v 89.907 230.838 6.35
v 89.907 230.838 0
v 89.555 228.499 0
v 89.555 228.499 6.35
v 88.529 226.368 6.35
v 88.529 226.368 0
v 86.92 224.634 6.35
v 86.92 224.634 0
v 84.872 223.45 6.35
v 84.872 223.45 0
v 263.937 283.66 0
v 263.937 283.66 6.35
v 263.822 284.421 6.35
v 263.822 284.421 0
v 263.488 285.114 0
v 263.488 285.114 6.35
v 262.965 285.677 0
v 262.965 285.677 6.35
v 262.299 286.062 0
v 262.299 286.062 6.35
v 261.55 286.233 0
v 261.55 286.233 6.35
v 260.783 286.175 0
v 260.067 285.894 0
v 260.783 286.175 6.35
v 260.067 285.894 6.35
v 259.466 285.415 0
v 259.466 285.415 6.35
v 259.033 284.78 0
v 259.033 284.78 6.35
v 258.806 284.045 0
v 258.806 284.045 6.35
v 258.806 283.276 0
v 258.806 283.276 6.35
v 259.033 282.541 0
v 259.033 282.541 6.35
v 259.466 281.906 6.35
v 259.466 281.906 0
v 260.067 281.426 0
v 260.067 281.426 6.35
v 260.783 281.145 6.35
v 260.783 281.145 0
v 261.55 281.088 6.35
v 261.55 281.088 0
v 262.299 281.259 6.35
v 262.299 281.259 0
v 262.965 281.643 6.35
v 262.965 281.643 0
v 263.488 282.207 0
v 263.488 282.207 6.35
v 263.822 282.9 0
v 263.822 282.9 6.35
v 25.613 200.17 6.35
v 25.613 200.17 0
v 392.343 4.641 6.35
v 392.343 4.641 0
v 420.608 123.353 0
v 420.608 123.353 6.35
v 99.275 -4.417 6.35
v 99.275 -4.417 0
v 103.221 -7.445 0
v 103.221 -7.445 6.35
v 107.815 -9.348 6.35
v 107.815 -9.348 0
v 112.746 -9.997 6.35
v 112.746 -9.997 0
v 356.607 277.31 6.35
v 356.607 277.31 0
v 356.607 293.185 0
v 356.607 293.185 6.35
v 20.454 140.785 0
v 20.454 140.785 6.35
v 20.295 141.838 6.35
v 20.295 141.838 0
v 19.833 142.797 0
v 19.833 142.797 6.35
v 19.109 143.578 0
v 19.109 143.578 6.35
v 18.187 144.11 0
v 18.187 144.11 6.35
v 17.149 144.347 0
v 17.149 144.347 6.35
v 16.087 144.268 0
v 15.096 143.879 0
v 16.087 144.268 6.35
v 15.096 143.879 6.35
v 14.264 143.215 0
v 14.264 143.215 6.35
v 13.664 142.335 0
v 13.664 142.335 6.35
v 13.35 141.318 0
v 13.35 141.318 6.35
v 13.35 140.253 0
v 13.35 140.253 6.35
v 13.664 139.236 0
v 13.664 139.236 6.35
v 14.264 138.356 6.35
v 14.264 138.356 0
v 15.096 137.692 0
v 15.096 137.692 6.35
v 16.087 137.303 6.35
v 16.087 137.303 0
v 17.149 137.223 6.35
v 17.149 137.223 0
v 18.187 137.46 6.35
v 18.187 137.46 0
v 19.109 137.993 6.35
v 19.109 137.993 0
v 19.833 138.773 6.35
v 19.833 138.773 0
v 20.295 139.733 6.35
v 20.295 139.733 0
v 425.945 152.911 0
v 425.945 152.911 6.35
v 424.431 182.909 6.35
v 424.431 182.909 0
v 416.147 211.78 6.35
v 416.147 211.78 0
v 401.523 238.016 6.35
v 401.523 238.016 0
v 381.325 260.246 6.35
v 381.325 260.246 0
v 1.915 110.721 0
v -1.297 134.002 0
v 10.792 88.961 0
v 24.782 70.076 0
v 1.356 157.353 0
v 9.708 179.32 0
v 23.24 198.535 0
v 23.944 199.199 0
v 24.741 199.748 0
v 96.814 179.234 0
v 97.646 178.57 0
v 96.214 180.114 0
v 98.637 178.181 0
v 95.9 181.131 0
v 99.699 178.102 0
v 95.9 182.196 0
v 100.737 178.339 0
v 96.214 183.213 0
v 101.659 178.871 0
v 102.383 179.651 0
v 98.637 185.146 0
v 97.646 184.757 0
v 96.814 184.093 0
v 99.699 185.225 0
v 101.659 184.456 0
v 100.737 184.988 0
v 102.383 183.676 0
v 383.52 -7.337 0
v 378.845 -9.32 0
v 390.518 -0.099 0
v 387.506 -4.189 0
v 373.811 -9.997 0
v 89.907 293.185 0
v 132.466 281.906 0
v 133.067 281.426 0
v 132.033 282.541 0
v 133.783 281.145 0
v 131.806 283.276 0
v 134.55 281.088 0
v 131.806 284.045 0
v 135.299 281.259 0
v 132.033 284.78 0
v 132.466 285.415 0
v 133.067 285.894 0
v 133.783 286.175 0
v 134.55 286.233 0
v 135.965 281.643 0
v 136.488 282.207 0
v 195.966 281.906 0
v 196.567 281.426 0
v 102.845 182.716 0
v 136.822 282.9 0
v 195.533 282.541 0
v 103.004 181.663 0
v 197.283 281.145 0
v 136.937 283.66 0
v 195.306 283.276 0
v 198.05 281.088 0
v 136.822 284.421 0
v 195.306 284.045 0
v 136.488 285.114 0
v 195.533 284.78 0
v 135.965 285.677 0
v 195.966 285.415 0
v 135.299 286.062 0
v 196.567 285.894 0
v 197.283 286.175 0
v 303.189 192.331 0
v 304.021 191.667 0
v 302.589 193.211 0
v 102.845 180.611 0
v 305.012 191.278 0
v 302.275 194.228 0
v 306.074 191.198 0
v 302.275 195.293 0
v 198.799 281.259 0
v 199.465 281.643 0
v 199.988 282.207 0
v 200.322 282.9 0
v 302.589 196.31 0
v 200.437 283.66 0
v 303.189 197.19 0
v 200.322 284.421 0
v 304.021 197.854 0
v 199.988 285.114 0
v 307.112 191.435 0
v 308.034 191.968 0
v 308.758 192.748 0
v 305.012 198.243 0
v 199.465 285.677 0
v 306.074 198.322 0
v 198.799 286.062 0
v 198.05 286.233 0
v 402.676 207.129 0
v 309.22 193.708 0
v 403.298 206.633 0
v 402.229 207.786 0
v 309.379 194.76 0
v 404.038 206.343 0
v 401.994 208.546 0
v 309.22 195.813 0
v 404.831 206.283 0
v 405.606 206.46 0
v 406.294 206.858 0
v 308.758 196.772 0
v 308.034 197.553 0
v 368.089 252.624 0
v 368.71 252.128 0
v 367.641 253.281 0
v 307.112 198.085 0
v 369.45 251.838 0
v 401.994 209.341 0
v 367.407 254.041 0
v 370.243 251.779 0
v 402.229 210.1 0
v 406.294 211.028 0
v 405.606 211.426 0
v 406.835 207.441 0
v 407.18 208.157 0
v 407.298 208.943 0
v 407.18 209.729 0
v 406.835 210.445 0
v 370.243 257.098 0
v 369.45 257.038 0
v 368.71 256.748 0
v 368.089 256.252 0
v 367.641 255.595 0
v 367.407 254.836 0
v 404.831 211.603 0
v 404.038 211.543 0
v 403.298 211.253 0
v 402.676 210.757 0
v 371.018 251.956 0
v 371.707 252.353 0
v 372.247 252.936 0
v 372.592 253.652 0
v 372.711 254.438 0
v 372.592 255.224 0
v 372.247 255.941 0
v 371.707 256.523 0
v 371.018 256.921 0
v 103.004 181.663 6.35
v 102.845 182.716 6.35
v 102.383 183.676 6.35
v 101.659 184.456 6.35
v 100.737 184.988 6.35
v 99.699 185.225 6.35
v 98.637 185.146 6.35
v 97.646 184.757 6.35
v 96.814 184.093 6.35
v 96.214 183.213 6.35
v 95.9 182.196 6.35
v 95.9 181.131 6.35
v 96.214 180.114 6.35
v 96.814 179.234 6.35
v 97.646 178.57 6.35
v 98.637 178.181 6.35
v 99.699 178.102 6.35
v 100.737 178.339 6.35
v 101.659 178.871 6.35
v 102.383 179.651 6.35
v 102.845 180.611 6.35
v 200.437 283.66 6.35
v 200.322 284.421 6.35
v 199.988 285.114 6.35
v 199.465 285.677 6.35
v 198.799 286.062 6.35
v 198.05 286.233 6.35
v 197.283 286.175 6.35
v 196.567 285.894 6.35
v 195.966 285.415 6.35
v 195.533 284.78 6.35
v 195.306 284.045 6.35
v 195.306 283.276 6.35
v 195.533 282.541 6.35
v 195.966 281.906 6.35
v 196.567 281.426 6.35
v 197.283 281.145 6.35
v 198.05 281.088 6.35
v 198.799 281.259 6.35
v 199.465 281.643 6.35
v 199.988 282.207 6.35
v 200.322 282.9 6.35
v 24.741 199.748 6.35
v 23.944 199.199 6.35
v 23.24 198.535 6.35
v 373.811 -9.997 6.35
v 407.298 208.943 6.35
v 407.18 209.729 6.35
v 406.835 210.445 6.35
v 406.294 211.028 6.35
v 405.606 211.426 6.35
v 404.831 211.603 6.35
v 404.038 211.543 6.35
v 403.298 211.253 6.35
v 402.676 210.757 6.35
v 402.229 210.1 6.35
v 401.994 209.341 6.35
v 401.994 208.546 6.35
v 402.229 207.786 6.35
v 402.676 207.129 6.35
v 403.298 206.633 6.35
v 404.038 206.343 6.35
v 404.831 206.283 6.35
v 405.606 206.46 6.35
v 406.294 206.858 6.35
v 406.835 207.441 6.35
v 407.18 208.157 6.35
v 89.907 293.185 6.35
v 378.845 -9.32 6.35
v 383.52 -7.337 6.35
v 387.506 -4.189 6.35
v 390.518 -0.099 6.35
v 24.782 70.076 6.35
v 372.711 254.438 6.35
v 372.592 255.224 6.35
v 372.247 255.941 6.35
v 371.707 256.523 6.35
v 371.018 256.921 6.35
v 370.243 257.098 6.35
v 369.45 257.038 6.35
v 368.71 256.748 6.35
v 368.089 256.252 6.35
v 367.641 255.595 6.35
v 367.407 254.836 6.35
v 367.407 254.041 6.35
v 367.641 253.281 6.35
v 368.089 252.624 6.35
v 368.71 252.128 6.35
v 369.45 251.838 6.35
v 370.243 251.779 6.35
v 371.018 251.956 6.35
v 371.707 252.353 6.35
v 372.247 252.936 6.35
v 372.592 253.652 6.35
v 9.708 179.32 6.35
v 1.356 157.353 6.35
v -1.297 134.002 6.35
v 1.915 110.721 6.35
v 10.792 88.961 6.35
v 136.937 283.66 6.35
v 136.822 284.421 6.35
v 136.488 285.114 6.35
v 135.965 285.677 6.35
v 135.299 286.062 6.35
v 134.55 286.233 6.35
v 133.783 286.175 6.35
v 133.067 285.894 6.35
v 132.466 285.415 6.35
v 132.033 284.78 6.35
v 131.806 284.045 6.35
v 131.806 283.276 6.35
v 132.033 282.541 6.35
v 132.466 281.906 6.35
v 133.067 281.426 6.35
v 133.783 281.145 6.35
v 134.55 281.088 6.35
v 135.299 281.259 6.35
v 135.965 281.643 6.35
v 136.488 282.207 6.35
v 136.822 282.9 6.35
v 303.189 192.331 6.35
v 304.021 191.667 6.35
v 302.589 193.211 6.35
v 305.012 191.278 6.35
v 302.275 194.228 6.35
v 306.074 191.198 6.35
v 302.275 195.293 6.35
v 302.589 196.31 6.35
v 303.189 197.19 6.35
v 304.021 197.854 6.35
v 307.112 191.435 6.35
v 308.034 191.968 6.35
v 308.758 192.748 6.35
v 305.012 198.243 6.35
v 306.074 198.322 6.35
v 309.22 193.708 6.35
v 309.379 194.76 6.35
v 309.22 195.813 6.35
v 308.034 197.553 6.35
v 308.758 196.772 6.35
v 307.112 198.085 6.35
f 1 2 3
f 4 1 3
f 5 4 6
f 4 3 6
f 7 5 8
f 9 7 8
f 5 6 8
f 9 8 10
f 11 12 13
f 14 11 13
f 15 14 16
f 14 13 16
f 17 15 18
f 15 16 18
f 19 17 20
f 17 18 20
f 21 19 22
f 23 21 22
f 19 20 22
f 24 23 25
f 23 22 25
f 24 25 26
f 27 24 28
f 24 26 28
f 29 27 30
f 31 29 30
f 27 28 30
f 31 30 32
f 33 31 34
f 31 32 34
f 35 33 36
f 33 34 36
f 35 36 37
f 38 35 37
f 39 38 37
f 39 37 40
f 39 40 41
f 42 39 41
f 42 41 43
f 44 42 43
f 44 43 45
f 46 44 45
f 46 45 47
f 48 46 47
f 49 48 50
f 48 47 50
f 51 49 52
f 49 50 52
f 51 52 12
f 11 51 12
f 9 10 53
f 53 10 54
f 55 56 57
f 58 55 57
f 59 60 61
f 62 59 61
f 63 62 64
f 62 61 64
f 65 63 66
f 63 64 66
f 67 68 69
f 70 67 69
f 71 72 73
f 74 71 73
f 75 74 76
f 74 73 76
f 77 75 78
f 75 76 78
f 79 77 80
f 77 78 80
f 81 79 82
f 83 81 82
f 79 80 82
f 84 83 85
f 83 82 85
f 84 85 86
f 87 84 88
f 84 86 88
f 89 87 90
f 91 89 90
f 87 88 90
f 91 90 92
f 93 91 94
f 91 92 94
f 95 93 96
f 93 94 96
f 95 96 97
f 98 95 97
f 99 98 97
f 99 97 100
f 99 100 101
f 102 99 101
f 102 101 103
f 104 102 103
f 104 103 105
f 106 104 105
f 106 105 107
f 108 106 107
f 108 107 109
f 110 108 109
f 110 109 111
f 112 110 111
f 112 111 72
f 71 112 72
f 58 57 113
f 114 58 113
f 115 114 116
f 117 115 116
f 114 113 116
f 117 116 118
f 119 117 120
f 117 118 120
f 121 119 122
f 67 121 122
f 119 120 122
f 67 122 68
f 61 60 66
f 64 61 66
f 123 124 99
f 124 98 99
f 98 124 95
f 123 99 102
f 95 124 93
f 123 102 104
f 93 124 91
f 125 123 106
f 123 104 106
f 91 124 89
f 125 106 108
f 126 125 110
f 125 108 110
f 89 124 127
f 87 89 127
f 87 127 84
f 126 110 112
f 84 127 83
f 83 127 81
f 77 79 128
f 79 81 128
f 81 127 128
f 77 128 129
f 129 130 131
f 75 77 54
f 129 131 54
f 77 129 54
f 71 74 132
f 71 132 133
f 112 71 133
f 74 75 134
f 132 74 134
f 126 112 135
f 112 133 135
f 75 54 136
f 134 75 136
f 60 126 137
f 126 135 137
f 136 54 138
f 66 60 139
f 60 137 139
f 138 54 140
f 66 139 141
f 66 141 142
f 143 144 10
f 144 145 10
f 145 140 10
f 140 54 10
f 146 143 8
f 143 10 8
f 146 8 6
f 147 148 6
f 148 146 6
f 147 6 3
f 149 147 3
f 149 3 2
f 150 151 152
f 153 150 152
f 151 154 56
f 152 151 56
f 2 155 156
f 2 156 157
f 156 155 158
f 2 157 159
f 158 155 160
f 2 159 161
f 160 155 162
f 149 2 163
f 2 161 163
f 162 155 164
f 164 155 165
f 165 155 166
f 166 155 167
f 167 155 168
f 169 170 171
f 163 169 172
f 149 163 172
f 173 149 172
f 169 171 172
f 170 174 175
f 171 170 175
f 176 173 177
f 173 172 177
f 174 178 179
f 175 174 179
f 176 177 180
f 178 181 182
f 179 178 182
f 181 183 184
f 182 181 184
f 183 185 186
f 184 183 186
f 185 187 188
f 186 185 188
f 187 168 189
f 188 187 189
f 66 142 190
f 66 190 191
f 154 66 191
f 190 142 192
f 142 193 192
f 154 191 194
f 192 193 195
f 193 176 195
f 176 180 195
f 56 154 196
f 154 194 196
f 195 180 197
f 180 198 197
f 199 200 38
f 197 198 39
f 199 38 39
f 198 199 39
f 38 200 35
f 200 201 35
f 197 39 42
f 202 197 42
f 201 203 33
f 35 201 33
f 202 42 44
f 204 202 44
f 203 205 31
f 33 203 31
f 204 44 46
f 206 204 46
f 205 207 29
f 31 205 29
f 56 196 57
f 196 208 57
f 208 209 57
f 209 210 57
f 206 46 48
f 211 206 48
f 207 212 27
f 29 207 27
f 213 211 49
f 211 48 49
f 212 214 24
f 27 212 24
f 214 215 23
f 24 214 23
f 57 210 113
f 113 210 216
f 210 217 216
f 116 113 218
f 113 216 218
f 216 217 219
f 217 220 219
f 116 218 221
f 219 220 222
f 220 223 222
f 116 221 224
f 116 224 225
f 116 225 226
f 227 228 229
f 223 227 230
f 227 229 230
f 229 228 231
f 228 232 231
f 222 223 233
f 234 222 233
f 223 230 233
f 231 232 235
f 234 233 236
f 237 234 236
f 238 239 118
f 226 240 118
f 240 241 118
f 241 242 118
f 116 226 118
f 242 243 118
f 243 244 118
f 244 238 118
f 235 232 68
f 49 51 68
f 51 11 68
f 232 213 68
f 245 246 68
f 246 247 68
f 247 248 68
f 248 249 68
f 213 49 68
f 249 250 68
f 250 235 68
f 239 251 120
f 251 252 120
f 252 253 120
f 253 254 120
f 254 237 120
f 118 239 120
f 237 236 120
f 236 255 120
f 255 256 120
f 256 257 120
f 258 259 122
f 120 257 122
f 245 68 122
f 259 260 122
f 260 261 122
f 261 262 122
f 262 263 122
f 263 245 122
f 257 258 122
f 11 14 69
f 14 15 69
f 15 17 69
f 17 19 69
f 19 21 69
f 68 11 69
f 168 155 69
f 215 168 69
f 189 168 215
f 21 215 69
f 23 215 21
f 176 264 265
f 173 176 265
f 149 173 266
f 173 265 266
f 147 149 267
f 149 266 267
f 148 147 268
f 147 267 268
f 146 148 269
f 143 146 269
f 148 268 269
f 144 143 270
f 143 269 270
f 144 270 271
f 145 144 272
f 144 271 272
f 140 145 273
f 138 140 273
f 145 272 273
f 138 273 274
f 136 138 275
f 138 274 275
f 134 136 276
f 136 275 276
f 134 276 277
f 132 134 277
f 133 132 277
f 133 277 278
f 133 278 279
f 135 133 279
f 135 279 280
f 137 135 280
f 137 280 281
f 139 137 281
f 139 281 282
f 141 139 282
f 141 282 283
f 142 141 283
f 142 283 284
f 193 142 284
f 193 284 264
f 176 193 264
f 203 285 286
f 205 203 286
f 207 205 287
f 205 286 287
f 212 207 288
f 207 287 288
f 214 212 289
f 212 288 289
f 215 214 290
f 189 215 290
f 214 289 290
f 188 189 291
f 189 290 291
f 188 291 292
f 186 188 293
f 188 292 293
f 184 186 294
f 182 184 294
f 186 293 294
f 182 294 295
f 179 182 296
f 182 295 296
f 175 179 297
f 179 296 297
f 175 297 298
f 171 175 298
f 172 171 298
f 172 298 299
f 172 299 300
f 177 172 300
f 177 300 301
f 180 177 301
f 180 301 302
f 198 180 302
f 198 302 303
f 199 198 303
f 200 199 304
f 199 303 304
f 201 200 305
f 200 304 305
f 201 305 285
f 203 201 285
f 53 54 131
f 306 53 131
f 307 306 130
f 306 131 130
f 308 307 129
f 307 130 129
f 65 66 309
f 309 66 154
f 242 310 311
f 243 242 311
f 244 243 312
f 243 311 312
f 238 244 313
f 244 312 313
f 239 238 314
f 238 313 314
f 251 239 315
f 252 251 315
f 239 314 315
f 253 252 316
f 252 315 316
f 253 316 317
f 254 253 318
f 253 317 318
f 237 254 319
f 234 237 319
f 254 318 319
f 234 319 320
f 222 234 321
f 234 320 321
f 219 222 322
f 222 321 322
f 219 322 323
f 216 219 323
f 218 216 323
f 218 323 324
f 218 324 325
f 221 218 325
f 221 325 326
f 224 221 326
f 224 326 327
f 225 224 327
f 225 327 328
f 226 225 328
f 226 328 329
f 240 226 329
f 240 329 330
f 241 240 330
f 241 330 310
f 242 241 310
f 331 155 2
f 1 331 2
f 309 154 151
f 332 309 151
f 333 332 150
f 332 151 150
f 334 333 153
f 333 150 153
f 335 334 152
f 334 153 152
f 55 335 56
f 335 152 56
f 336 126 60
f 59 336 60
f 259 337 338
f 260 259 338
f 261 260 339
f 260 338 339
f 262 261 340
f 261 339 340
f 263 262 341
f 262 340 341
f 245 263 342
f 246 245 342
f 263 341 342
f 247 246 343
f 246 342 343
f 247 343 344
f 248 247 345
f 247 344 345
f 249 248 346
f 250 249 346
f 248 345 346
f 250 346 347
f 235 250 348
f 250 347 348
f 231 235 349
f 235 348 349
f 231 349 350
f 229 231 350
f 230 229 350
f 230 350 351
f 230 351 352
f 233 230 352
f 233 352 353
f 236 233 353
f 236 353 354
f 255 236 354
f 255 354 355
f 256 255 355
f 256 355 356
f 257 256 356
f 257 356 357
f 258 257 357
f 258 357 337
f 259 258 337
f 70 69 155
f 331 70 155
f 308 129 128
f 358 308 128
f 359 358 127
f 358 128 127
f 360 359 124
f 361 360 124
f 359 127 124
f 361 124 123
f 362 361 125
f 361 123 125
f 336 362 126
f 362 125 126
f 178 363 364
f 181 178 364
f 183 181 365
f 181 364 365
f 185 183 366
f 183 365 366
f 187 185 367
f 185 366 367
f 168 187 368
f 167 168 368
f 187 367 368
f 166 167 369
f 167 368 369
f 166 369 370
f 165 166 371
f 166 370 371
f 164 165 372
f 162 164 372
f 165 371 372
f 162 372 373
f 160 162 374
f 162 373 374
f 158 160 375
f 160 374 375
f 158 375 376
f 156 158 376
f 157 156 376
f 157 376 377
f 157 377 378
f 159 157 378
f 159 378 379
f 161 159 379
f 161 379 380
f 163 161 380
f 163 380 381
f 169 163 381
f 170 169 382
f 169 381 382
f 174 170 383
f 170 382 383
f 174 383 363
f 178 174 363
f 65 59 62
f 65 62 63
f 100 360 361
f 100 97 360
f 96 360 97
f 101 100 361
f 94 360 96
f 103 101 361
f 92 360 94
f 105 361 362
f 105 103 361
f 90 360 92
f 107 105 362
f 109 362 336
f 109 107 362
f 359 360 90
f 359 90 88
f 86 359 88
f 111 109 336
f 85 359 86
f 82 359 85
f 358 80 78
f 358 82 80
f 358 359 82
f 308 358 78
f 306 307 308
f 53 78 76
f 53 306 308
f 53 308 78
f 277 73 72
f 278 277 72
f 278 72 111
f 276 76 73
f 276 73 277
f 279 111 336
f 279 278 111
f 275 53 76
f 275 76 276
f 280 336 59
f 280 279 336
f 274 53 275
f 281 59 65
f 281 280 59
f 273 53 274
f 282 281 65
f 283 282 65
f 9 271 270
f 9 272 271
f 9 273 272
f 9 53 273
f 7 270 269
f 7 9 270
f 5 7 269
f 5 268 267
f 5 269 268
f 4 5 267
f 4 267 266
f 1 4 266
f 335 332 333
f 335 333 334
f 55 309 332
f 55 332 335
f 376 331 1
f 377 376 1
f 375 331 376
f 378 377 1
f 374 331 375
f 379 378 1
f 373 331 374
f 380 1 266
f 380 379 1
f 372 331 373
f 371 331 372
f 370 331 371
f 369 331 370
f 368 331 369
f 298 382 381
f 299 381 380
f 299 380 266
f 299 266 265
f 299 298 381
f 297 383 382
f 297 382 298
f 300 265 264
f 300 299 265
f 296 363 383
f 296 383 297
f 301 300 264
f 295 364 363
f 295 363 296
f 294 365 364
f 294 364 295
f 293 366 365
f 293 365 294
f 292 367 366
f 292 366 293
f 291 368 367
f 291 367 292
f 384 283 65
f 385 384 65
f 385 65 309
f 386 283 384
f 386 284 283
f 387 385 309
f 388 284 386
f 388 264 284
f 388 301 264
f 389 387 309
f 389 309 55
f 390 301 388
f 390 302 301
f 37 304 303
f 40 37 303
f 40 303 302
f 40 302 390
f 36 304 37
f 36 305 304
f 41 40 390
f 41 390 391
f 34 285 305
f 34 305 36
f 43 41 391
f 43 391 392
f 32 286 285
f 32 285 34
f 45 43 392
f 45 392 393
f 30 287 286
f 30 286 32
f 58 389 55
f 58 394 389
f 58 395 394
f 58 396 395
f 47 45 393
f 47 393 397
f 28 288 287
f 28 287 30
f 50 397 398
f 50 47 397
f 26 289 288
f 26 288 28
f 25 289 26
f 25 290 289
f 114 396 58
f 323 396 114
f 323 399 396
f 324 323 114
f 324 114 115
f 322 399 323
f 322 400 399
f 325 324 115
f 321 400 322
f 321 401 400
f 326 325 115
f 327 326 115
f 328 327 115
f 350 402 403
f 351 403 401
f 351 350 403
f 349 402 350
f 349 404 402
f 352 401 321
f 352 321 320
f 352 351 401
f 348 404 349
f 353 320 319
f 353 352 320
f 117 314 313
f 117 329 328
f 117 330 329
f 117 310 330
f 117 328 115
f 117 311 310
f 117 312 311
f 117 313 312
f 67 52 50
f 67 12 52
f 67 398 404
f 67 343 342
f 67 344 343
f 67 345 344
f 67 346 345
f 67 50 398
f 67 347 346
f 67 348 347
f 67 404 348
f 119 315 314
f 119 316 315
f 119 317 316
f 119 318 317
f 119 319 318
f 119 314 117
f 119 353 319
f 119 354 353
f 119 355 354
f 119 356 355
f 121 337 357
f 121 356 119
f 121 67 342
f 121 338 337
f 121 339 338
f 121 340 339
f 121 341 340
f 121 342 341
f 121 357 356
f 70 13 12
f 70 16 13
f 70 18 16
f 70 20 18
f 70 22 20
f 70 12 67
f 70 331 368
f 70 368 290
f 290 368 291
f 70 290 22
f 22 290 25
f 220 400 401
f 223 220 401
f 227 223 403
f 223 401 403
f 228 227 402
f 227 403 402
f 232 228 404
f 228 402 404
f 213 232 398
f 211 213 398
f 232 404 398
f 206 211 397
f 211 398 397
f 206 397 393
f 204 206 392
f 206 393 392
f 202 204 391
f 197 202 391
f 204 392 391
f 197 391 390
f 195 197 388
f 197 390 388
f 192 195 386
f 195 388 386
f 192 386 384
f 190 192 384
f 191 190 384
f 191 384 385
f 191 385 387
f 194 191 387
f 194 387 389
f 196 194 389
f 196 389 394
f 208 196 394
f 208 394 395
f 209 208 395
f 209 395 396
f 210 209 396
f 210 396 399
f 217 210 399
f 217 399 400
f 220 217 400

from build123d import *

# Parameters (mm, degrees)
F1_DEPTH = 6.35
F2_R     = 2.579688
F3_DEPTH = 6.35
F4_R     = 3.571875
F5_DEPTH = 9.525
F6_R     = 2.667
F7_DEPTH = 7.62


with BuildPart() as f1:
    # F0 (on Top) → F1 (new body)
    with BuildSketch(Plane.XY):
        with BuildLine():
            Line((356.607027, 293.18534), (89.907027, 293.18534))
            Line((89.907027, 293.18534), (89.907027, 230.838141))
            ThreePointArc((89.907027, 230.838141), (88.528545, 226.367885), (84.871893, 223.450301))
            Line((84.871893, 223.450301), (25.612706, 200.169907))
            ThreePointArc((25.612706, 200.169907), (24.332233, 199.488924), (23.239671, 198.535164))
            ThreePointArc((23.239671, 198.535164), (-1.297086, 134.001926), (24.781553, 70.076219))
            Line((24.781553, 70.076219), (99.27516, -4.417388))
            ThreePointArc((99.27516, -4.417388), (105.455425, -8.546909), (112.745544, -9.997004))
            Line((112.745544, -9.997004), (373.810915, -9.997004))
            ThreePointArc((373.810915, -9.997004), (385.618685, -5.89622), (392.342874, 4.640625))
            Line((392.342874, 4.640625), (420.607724, 123.352996))
            ThreePointArc((420.607724, 123.352996), (416.146731, 211.779891), (356.607027, 277.31034))
            Line((356.607027, 277.31034), (356.607027, 293.18534))
        make_face()
    extrude(amount=F1_DEPTH)

    # F2 (on face) → F3 (cut, through all)
    with BuildSketch(Plane.XY.offset(6.35)):
        with Locations((261.357027, 283.66034)):
            Circle(F2_R)
        with Locations((197.857027, 283.66034)):
            Circle(F2_R)
        with Locations((134.357027, 283.66034)):
            Circle(F2_R)
    extrude(amount=-F3_DEPTH, mode=Mode.SUBTRACT)

    # F4 (on face) → F5 (cut)
    with BuildSketch(Plane.XY.offset(6.35)):
        with Locations((99.432027, 181.663465)):
            Circle(F4_R)
        with Locations((16.882027, 140.78534)):
            Circle(F4_R)
        with Locations((305.807027, 194.76034)):
            Circle(F4_R)
    extrude(amount=-F5_DEPTH, mode=Mode.SUBTRACT)

    # F6 (on face) → F7 (cut)
    with BuildSketch(Plane.XY.offset(6.35)):
        with Locations((370.04372, 254.438187)):
            Circle(F6_R)
        with Locations((404.631483, 208.943032)):
            Circle(F6_R)
    extrude(amount=-F7_DEPTH, mode=Mode.SUBTRACT)


solid = f1.part
